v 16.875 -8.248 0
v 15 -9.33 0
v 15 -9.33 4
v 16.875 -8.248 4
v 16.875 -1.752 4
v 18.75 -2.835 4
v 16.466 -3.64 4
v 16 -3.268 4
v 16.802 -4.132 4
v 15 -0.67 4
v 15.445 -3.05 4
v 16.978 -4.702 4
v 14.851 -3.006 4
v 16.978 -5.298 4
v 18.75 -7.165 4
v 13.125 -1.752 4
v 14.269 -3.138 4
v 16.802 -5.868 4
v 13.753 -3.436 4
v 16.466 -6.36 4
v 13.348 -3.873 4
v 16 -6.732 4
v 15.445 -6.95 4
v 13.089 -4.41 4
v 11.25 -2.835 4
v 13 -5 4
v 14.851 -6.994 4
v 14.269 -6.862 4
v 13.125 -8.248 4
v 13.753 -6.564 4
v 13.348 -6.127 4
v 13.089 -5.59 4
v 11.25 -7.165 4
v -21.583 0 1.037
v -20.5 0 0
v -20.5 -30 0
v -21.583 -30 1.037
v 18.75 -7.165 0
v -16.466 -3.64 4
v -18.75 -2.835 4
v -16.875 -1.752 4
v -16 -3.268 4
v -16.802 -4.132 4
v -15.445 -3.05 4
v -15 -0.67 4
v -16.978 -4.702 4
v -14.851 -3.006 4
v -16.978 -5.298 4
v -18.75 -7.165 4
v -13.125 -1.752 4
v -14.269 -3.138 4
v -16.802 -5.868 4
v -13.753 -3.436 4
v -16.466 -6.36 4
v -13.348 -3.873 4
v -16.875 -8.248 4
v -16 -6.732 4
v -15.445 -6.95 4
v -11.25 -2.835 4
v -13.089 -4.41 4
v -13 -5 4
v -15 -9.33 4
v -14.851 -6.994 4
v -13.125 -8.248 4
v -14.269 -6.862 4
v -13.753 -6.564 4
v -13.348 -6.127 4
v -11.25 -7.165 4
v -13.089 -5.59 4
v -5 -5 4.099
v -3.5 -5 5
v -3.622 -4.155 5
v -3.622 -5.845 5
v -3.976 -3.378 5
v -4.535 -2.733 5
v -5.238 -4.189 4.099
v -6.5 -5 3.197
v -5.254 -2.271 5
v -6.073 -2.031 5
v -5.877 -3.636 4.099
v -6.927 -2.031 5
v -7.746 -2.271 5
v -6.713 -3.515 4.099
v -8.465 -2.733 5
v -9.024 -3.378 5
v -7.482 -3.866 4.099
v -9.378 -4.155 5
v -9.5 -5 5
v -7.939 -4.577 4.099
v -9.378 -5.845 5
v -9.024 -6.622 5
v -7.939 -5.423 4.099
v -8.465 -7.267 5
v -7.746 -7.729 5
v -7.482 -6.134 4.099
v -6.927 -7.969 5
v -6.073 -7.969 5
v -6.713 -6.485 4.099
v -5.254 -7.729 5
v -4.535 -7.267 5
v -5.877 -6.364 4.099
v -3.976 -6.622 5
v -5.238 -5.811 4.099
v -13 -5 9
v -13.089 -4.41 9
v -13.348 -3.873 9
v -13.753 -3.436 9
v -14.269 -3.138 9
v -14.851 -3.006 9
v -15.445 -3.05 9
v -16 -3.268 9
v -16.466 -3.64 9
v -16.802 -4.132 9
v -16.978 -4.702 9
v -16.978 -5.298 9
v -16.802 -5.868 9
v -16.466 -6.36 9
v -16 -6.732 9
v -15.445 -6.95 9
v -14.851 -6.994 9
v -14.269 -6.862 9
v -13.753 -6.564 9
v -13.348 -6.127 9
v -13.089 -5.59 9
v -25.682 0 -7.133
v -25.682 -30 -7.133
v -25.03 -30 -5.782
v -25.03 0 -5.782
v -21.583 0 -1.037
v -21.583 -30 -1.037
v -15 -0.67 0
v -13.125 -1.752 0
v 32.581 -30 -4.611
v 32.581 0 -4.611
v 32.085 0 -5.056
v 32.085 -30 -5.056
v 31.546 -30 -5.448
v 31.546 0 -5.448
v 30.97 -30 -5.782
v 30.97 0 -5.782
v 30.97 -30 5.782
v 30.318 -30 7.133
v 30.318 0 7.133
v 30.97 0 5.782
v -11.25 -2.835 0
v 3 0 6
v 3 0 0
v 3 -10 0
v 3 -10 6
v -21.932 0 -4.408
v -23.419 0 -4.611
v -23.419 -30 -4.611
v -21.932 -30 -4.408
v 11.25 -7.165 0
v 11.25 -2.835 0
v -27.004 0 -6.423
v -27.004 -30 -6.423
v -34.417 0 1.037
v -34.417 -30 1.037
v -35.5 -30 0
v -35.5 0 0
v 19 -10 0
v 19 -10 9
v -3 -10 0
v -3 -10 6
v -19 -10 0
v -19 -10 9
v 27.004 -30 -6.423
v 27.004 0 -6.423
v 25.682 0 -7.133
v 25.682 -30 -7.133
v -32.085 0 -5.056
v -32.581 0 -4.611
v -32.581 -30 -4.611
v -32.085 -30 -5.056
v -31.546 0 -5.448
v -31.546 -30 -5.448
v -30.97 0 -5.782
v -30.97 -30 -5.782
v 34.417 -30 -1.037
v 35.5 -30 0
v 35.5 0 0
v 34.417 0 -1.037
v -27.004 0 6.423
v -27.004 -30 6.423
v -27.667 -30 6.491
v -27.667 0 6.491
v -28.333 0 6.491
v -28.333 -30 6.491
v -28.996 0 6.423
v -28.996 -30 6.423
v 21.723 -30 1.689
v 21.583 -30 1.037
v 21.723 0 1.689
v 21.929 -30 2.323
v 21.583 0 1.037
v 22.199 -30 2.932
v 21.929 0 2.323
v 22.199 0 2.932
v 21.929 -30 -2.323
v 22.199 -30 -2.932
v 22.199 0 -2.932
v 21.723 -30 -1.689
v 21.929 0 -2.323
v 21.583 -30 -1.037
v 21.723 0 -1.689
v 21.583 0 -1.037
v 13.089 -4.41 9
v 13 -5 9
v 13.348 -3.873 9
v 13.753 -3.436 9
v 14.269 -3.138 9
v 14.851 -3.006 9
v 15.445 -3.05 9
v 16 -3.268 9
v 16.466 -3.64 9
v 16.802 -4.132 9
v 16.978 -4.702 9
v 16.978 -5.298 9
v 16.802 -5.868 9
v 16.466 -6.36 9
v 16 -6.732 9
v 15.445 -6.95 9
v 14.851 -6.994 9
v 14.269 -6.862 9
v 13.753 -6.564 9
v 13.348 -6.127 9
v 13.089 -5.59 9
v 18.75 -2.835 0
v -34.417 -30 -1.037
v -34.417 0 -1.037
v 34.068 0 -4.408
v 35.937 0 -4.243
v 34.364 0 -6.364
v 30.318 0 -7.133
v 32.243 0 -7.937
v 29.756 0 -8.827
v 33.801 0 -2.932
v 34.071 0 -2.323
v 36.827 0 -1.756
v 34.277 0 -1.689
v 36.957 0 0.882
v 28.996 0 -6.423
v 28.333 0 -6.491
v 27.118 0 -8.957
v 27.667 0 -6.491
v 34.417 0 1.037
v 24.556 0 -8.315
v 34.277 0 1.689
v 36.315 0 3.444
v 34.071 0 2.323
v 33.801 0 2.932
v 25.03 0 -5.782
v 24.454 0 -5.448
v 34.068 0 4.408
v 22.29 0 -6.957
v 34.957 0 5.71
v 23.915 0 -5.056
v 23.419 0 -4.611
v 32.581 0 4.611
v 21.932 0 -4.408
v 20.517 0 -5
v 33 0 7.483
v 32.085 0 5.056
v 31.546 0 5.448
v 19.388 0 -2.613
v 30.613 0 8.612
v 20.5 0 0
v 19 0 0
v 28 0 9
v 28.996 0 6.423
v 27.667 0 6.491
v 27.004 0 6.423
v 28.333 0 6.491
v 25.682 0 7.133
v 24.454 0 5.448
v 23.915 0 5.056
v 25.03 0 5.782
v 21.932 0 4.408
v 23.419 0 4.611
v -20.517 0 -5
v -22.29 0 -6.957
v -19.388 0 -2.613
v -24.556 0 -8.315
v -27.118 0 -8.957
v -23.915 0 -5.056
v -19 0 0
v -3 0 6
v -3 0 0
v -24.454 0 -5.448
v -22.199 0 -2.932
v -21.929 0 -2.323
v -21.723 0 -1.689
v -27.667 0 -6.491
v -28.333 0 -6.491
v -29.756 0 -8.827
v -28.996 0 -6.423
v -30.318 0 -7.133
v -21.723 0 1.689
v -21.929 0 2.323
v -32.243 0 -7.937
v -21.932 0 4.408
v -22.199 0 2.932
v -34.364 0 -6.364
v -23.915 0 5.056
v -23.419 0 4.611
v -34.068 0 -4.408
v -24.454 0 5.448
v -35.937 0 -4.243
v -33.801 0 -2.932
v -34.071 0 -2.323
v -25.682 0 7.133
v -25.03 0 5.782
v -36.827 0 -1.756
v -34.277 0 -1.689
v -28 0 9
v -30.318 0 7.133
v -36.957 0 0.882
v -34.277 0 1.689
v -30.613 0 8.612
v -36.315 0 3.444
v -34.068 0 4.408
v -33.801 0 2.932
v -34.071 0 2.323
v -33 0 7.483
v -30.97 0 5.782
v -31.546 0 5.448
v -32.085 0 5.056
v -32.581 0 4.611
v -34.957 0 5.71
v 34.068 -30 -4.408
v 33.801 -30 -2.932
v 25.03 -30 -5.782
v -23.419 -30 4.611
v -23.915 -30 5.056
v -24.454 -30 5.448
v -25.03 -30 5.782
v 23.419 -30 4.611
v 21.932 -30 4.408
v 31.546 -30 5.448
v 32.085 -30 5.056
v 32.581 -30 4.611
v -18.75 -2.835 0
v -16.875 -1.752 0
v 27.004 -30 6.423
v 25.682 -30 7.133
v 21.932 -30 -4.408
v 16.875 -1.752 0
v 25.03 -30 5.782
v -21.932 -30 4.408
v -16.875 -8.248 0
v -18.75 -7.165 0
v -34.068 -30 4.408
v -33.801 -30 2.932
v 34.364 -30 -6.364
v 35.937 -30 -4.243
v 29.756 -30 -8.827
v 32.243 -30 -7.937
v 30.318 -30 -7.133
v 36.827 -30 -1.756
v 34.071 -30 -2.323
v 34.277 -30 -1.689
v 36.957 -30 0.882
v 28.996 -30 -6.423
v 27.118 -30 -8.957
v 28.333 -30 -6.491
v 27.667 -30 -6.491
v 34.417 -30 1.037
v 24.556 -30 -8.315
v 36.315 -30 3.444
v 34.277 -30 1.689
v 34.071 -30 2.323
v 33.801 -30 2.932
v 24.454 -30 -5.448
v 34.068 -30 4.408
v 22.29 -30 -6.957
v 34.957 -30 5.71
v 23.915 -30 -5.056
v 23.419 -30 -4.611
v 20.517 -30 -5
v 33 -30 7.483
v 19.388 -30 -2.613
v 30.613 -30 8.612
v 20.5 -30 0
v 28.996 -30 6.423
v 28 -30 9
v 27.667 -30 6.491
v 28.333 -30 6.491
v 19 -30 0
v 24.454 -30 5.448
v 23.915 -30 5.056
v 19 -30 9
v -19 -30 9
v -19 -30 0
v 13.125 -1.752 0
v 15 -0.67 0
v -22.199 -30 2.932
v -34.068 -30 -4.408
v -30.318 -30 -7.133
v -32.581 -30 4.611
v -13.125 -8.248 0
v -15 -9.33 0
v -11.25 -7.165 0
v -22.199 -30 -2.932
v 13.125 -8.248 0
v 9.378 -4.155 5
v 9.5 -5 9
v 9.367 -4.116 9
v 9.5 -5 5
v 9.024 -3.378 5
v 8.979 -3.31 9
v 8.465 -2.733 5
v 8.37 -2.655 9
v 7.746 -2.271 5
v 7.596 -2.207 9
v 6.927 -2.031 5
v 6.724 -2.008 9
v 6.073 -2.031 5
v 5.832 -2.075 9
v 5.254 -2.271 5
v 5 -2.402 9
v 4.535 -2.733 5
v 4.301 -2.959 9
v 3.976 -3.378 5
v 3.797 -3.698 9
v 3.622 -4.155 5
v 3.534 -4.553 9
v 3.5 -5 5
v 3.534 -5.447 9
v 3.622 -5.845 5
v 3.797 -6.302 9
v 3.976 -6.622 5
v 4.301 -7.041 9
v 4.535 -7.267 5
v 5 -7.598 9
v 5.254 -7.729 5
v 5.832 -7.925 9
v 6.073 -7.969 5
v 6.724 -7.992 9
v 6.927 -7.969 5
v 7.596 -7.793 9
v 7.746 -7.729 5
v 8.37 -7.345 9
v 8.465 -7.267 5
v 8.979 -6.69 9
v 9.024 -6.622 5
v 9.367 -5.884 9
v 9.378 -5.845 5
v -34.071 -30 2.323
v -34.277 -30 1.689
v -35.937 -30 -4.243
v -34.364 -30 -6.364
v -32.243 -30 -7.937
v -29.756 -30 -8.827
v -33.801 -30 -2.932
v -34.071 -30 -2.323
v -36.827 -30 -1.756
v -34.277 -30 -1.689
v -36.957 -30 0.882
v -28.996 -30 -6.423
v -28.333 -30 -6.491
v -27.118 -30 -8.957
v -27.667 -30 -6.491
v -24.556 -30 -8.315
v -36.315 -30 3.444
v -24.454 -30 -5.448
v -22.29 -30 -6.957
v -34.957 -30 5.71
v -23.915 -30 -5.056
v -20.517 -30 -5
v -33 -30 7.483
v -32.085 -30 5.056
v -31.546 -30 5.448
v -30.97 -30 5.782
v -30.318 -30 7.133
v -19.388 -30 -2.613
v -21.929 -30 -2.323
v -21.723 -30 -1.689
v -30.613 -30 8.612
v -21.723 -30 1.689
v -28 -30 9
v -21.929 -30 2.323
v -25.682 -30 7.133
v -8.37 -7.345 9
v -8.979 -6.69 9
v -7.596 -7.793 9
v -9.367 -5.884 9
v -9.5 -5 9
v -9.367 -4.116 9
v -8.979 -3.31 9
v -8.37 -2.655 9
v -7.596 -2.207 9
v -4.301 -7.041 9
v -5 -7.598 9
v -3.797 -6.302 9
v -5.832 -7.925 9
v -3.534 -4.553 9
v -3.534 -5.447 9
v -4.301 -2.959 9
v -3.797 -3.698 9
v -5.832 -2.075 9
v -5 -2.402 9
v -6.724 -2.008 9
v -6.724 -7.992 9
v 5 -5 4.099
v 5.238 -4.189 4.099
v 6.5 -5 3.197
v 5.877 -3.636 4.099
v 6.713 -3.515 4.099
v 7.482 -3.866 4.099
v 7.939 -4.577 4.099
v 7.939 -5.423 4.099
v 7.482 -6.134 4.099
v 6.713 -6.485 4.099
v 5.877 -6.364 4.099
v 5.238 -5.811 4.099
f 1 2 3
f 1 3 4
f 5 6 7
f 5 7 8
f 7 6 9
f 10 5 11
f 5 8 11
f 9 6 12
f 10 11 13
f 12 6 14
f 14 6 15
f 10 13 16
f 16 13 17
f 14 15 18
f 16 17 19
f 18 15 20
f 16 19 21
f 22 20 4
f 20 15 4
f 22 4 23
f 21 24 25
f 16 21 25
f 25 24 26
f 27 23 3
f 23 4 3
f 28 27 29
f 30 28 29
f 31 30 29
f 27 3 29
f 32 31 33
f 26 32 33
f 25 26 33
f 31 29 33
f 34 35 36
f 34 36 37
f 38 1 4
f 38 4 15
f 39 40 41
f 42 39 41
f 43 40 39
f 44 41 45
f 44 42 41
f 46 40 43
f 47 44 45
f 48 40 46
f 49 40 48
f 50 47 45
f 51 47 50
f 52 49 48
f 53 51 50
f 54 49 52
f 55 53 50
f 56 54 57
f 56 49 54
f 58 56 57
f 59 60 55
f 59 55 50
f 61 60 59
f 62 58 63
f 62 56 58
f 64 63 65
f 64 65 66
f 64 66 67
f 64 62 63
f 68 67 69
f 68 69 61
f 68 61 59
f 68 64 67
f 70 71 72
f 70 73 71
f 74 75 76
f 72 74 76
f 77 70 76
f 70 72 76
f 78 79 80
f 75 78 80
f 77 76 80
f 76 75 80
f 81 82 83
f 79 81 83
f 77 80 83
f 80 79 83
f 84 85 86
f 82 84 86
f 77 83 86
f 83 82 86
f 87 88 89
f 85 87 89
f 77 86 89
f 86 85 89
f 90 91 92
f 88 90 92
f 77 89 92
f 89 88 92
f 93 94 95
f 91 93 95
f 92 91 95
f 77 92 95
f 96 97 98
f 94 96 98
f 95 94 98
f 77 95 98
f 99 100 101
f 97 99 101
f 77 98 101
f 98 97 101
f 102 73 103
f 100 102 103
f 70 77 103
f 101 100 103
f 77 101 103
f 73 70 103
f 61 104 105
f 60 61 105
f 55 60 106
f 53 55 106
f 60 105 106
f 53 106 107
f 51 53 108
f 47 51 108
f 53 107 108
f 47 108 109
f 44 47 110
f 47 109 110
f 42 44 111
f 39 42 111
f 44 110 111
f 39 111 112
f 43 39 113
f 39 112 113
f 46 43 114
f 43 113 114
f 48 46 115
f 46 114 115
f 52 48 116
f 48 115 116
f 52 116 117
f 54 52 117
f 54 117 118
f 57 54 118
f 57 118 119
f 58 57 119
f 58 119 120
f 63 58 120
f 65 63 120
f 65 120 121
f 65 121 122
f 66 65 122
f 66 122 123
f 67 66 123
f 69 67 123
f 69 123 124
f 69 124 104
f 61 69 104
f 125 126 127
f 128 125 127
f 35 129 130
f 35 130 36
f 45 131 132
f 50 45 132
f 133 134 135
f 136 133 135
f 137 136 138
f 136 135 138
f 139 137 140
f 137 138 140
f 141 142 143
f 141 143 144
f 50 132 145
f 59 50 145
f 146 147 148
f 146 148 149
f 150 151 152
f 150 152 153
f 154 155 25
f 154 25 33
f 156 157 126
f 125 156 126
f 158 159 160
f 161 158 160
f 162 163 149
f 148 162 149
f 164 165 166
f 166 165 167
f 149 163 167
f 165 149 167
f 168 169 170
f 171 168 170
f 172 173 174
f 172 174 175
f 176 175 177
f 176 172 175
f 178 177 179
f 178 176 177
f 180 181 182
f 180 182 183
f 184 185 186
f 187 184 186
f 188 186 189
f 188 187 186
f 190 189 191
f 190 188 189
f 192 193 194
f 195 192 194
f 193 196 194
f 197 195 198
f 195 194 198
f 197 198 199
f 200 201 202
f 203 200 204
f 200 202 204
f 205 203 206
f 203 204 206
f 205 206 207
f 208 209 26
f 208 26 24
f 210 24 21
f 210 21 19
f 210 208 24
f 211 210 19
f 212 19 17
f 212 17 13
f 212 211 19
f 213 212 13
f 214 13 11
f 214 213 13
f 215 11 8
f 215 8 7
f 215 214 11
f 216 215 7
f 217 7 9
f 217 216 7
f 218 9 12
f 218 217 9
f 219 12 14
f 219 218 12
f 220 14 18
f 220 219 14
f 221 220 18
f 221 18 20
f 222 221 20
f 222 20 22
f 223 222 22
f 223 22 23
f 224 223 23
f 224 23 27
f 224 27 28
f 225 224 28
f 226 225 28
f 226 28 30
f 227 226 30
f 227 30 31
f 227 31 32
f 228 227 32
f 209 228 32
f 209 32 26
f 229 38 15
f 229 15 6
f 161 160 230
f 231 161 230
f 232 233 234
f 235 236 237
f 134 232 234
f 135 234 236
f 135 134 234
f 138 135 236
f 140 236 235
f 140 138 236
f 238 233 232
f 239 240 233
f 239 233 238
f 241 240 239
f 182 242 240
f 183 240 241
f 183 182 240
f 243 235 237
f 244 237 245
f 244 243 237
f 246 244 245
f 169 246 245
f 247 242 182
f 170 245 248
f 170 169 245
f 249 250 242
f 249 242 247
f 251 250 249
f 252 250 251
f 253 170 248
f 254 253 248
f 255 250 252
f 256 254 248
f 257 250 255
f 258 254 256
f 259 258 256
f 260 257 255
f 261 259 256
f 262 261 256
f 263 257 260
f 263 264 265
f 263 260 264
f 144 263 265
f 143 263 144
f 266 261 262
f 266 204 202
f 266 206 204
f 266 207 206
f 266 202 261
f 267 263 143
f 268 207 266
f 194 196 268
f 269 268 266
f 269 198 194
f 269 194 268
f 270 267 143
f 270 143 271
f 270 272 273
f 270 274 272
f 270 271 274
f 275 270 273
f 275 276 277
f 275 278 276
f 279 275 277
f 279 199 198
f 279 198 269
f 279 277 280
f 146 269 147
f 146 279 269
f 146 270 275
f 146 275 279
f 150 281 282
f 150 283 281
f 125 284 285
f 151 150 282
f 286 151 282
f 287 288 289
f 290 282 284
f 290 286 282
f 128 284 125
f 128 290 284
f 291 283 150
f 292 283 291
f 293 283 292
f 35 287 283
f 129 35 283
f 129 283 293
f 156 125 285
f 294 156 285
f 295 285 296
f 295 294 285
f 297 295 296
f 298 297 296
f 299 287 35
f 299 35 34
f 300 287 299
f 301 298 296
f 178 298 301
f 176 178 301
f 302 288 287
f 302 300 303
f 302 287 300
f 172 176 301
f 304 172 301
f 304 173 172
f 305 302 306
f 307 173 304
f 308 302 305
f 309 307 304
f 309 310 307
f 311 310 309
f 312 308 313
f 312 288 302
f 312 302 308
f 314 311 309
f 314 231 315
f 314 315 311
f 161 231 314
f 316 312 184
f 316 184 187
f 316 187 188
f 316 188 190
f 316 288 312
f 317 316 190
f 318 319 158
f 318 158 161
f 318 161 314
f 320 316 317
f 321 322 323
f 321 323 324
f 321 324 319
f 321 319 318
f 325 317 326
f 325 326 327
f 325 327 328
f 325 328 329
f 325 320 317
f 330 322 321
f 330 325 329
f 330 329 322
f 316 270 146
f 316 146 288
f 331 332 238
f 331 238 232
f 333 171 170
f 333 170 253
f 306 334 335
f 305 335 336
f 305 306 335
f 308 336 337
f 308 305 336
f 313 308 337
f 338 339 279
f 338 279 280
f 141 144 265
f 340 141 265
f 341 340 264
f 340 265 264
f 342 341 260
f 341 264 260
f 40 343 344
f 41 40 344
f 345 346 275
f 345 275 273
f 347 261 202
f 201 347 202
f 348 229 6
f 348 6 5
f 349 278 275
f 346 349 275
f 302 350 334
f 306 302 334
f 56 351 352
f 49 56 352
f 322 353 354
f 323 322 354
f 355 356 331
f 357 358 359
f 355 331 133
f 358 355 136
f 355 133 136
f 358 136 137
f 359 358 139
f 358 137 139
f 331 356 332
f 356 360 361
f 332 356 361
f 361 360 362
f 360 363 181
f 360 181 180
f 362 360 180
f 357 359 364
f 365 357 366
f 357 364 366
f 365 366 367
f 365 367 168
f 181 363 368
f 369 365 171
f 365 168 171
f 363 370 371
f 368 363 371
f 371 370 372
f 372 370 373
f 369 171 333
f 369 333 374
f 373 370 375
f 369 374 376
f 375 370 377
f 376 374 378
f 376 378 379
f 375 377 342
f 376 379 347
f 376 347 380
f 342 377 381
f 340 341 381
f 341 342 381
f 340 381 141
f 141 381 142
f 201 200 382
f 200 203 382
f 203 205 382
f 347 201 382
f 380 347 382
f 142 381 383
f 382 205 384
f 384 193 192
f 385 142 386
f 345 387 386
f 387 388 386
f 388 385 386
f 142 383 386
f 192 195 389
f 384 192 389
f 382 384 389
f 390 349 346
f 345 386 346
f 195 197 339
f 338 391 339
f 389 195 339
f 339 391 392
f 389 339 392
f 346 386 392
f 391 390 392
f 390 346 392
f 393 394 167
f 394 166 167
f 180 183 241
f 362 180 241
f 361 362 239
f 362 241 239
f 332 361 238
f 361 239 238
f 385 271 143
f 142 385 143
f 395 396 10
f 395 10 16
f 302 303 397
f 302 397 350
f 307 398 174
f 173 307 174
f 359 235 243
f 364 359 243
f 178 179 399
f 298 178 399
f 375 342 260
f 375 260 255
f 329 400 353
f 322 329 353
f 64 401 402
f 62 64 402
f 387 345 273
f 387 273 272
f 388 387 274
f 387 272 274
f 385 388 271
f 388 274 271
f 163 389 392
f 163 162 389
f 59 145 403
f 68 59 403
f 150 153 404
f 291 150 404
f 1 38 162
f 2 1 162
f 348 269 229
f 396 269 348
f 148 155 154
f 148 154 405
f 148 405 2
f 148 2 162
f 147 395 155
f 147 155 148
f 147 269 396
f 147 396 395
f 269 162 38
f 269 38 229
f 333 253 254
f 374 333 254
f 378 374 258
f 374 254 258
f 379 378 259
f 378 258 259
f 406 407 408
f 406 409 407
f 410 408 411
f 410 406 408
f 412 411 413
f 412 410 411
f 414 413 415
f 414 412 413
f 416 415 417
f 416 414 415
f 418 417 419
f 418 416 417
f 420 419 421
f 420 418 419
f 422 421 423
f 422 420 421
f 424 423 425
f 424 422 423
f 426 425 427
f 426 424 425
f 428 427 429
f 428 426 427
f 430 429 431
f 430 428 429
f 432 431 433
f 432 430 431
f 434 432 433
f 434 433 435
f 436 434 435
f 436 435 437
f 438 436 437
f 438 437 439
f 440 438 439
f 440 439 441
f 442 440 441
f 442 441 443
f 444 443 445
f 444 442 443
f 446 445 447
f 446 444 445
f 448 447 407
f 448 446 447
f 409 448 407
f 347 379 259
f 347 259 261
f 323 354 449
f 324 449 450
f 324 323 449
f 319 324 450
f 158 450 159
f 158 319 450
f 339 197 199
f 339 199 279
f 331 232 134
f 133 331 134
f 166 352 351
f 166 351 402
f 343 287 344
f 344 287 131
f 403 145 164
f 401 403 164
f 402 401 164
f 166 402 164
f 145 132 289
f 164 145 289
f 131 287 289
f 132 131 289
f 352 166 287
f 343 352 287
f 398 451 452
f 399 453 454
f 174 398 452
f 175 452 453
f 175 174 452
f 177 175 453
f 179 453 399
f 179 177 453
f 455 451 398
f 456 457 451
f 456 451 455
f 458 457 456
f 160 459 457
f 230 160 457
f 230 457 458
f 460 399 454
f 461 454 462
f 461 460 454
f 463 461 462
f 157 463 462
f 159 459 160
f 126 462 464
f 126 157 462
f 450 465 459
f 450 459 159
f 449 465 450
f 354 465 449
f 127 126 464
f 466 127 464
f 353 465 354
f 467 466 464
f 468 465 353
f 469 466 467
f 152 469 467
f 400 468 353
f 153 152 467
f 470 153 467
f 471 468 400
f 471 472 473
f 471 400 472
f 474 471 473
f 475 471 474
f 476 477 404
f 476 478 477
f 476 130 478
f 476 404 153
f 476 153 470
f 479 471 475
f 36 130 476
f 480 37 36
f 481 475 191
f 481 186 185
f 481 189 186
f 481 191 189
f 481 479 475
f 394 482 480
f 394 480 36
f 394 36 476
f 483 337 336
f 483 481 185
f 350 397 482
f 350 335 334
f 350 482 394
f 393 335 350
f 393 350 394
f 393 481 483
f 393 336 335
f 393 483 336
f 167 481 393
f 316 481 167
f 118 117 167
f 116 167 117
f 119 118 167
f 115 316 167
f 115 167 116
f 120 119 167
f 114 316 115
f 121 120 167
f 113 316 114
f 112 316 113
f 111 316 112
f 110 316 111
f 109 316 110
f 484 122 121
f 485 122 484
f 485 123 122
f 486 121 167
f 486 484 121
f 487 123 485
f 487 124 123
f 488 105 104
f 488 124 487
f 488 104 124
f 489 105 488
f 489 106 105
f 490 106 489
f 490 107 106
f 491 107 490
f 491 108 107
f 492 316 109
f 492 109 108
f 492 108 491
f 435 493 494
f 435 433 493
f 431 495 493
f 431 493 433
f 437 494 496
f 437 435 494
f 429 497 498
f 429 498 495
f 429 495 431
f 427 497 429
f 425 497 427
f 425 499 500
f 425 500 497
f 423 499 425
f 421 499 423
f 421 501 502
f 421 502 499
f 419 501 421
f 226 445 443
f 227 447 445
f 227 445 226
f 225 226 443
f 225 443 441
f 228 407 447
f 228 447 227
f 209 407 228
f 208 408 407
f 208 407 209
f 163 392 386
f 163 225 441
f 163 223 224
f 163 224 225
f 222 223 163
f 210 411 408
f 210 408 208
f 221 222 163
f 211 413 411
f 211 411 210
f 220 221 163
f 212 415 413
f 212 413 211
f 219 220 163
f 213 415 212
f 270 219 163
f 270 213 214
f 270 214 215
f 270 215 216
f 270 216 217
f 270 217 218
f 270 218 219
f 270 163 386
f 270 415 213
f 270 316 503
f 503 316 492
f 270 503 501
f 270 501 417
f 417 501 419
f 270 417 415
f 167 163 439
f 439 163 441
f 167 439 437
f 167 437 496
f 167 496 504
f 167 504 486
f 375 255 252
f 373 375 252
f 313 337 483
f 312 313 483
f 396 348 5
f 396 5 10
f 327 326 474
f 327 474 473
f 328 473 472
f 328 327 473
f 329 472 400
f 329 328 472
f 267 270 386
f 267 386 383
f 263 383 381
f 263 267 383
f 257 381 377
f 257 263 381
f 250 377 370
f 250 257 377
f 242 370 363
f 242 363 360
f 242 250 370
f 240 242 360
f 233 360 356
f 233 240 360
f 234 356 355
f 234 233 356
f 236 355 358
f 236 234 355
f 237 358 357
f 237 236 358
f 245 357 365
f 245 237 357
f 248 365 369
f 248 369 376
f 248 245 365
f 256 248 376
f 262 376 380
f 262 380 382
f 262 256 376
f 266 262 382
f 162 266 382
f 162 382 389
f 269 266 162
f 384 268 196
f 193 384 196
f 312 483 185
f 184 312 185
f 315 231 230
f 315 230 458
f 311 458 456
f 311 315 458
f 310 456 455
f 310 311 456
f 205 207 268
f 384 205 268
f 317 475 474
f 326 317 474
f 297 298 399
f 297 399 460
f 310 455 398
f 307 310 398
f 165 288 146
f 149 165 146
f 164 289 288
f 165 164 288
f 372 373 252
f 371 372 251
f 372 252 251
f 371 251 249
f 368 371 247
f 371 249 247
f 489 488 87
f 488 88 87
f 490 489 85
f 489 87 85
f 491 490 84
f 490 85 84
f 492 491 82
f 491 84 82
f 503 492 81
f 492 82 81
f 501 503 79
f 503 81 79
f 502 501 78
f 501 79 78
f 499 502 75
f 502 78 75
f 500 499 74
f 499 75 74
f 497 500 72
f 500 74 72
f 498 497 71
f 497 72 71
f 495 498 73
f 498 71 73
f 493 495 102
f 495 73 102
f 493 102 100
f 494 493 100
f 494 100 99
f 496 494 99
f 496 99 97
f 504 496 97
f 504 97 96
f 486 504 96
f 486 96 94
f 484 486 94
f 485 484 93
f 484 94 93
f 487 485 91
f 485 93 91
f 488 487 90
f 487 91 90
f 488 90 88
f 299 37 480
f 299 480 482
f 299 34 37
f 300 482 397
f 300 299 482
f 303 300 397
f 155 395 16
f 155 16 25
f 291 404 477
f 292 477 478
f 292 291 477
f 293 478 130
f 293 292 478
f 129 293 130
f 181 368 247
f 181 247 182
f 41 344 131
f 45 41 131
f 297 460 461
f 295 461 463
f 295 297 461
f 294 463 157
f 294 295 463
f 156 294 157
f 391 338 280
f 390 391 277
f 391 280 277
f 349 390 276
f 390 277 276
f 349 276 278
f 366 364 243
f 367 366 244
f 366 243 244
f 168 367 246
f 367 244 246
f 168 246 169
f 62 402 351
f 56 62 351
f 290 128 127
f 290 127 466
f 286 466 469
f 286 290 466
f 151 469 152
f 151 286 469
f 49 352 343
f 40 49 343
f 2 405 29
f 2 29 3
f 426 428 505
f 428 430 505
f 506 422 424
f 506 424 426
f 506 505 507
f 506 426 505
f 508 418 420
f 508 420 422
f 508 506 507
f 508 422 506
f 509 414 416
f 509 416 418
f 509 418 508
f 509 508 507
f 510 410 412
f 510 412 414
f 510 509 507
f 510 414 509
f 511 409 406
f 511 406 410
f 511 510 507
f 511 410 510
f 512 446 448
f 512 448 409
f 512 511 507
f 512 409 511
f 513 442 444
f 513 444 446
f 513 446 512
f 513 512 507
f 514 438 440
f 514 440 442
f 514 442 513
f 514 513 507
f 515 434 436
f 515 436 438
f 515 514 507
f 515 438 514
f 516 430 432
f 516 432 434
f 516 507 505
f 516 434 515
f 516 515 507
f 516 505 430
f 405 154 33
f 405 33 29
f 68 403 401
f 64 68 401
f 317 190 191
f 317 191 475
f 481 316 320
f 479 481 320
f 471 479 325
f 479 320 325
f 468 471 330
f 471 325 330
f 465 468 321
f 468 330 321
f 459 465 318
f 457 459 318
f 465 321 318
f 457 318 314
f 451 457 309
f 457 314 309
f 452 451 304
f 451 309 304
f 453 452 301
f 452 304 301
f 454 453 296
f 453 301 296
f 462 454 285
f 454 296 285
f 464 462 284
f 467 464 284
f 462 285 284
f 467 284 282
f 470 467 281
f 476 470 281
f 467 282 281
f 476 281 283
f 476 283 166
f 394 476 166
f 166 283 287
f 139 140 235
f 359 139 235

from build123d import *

# Parameters (mm, degrees)
F0_R            = 6.5
F1_DEPTH        = 25
F2_W            = 19
F2_H            = 9
F3_DEPTH        = 15
F4_R            = 2
F5_DEPTH        = 18.001
F7_DEPTH        = 25.001
F7_COPIES_COUNT = 10
F9_DEPTH        = 4
F10_DEPTH       = 5
F12_D           = 6
F12_DEPTH       = 4
F12_TIP         = 1.8025818571
F13_W           = 3
F13_H           = 6
F14_DEPTH       = 30.001


# Not quite as in the source:
# - a pattern or mirror of a feature is missing from the dataset's text; its kind, count and spacing are read off the source's solid


with BuildPart() as f1:
    # F0 (on Front) → F1 (new body)
    with BuildSketch(Plane.XZ):
        with BuildLine():
            Line((-19, 0), (0, 0))
            Line((0, 0), (0, 9))
            Line((0, 9), (-28, 9))
            ThreePointArc((-28, 9), (-21.6360389693, 6.3639610307), (-19, 0))
        make_face()
        with BuildLine():
            ThreePointArc((-28, 9), (-34.3639610307, -6.3639610307), (-19, 0))
            ThreePointArc((-19, 0), (-21.6360389693, 6.3639610307), (-28, 9))
        make_face()
        with Locations((-28, 0)):
            Circle(F0_R, mode=Mode.SUBTRACT)
    extrude(amount=F1_DEPTH)

    # F2 (on face) → F3 (cut)
    with BuildSketch(Plane.XZ.offset(25)):
        with Locations((-9.5, 4.5)):
            Rectangle(F2_W, F2_H)
    extrude(amount=-F3_DEPTH, mode=Mode.SUBTRACT)

    # F4 (on face) → F5 (cut, through all)
    with BuildSketch(Plane.XY.offset(9)):
        with Locations((-15, -5)):
            Circle(F4_R)
    extrude(amount=-F5_DEPTH, mode=Mode.SUBTRACT)

    # F6 (on face) → F7 (cut, through all)
    with BuildSketch(Plane.XZ.offset(25)):
        with BuildLine():
            Line((-21.5833333333, -1.0374916332), (-20.5, 0))
            Line((-20.5, 0), (-21.5833333333, 1.0374916332))
            ThreePointArc((-21.5833333333, 1.0374916332), (-21.5, 0), (-21.5833333333, -1.0374916332))
        make_face()
    f7 = extrude(amount=-F7_DEPTH, mode=Mode.SUBTRACT)

    # F7_copies: F7 ×10 about axis
    f7_copies_axis = Axis((-28, 0, 0), (0, 1, 0))
    for i in range(1, F7_COPIES_COUNT):
        add(f7.rotate(f7_copies_axis, i * 360 / F7_COPIES_COUNT), mode=Mode.SUBTRACT)

    # F8 (on face) → F9 (cut)
    with BuildSketch(Plane(origin=(0, 0, 0), x_dir=(1, 0, 0), z_dir=(0, 0, -1))):
        with BuildLine():
            ThreePointArc((-13.1250001976, 1.7524046217), (-11.7524047929, 3.1249999012), (-11.25, 5))
            ThreePointArc((-11.25, 5), (-11.7524048104, 6.8750001292), (-13.1250002583, 8.2475954133))
            ThreePointArc((-13.1250002583, 8.2475954133), (-15.0000000004, 8.75), (-16.8749997424, 8.2475954129))
            ThreePointArc((-16.8749997424, 8.2475954129), (-18.2475951898, 6.8750001288), (-18.75, 5))
            ThreePointArc((-18.75, 5), (-18.2475951898, 3.1249998712), (-16.8749997424, 1.7524045871))
            ThreePointArc((-16.8749997424, 1.7524045871), (-14.9999999654, 1.25), (-13.1250001976, 1.7524046217))
        make_face()
        with BuildLine():
            Line((-11.25, 2.8349364905), (-11.25, 5))
            ThreePointArc((-11.25, 5), (-11.7524047929, 3.1249999012), (-13.1250001976, 1.7524046217))
            Line((-13.1250001976, 1.7524046217), (-11.25, 2.8349364905))
        make_face()
        with BuildLine():
            ThreePointArc((-13.1250002583, 8.2475954133), (-11.7524048104, 6.8750001292), (-11.25, 5))
            Line((-11.25, 5), (-11.25, 7.1650635095))
            Line((-11.25, 7.1650635095), (-13.1250002583, 8.2475954133))
        make_face()
        with BuildLine():
            ThreePointArc((-16.8749997424, 8.2475954129), (-15.0000000004, 8.75), (-13.1250002583, 8.2475954133))
            Line((-13.1250002583, 8.2475954133), (-15, 9.3301270189))
            Line((-15, 9.3301270189), (-16.8749997424, 8.2475954129))
        make_face()
        with BuildLine():
            Line((-15, 0.6698729811), (-13.1250001976, 1.7524046217))
            ThreePointArc((-13.1250001976, 1.7524046217), (-14.9999999654, 1.25), (-16.8749997424, 1.7524045871))
            Line((-16.8749997424, 1.7524045871), (-15, 0.6698729811))
        make_face()
        with BuildLine():
            ThreePointArc((-18.75, 5), (-18.2475951898, 6.8750001288), (-16.8749997424, 8.2475954129))
            Line((-16.8749997424, 8.2475954129), (-18.75, 7.1650635095))
            Line((-18.75, 7.1650635095), (-18.75, 5))
        make_face()
        with BuildLine():
            Line((-18.75, 2.8349364905), (-16.8749997424, 1.7524045871))
            ThreePointArc((-16.8749997424, 1.7524045871), (-18.2475951898, 3.1249998712), (-18.75, 5))
            Line((-18.75, 5), (-18.75, 2.8349364905))
        make_face()
    extrude(amount=-F9_DEPTH, mode=Mode.SUBTRACT)

    # F10 (add): a face of the model
    f10_faces = [f1.faces().sort_by_distance(p)[0] for p in [
        (-34.1839610307, -25, -6.1839610307),
    ]]
    extrude(f10_faces, amount=F10_DEPTH)

    # F12
    with Locations(Plane.XY.offset(9)):
        with Locations((-6.5, -5)):
            Hole(F12_D / 2, depth=F12_DEPTH)
            with Locations((0, 0, -(F12_DEPTH + F12_TIP / 2))):  # 118° drill point
                Cone(0, F12_D / 2, F12_TIP, mode=Mode.SUBTRACT)

    # F13 (on face) → F14 (cut, through all)
    with BuildSketch(Plane(origin=(0, 0, 0), x_dir=(-1, 0, 0), z_dir=(0, 1, 0))):
        with Locations((1.5, 3)):
            Rectangle(F13_W, F13_H)
    extrude(amount=-F14_DEPTH, mode=Mode.SUBTRACT)

    # F15: F1 across plane


with BuildPart() as f1_1:
    add(f1.part)
    add(f1.part.mirror(Plane.YZ))


solid = f1_1.part
